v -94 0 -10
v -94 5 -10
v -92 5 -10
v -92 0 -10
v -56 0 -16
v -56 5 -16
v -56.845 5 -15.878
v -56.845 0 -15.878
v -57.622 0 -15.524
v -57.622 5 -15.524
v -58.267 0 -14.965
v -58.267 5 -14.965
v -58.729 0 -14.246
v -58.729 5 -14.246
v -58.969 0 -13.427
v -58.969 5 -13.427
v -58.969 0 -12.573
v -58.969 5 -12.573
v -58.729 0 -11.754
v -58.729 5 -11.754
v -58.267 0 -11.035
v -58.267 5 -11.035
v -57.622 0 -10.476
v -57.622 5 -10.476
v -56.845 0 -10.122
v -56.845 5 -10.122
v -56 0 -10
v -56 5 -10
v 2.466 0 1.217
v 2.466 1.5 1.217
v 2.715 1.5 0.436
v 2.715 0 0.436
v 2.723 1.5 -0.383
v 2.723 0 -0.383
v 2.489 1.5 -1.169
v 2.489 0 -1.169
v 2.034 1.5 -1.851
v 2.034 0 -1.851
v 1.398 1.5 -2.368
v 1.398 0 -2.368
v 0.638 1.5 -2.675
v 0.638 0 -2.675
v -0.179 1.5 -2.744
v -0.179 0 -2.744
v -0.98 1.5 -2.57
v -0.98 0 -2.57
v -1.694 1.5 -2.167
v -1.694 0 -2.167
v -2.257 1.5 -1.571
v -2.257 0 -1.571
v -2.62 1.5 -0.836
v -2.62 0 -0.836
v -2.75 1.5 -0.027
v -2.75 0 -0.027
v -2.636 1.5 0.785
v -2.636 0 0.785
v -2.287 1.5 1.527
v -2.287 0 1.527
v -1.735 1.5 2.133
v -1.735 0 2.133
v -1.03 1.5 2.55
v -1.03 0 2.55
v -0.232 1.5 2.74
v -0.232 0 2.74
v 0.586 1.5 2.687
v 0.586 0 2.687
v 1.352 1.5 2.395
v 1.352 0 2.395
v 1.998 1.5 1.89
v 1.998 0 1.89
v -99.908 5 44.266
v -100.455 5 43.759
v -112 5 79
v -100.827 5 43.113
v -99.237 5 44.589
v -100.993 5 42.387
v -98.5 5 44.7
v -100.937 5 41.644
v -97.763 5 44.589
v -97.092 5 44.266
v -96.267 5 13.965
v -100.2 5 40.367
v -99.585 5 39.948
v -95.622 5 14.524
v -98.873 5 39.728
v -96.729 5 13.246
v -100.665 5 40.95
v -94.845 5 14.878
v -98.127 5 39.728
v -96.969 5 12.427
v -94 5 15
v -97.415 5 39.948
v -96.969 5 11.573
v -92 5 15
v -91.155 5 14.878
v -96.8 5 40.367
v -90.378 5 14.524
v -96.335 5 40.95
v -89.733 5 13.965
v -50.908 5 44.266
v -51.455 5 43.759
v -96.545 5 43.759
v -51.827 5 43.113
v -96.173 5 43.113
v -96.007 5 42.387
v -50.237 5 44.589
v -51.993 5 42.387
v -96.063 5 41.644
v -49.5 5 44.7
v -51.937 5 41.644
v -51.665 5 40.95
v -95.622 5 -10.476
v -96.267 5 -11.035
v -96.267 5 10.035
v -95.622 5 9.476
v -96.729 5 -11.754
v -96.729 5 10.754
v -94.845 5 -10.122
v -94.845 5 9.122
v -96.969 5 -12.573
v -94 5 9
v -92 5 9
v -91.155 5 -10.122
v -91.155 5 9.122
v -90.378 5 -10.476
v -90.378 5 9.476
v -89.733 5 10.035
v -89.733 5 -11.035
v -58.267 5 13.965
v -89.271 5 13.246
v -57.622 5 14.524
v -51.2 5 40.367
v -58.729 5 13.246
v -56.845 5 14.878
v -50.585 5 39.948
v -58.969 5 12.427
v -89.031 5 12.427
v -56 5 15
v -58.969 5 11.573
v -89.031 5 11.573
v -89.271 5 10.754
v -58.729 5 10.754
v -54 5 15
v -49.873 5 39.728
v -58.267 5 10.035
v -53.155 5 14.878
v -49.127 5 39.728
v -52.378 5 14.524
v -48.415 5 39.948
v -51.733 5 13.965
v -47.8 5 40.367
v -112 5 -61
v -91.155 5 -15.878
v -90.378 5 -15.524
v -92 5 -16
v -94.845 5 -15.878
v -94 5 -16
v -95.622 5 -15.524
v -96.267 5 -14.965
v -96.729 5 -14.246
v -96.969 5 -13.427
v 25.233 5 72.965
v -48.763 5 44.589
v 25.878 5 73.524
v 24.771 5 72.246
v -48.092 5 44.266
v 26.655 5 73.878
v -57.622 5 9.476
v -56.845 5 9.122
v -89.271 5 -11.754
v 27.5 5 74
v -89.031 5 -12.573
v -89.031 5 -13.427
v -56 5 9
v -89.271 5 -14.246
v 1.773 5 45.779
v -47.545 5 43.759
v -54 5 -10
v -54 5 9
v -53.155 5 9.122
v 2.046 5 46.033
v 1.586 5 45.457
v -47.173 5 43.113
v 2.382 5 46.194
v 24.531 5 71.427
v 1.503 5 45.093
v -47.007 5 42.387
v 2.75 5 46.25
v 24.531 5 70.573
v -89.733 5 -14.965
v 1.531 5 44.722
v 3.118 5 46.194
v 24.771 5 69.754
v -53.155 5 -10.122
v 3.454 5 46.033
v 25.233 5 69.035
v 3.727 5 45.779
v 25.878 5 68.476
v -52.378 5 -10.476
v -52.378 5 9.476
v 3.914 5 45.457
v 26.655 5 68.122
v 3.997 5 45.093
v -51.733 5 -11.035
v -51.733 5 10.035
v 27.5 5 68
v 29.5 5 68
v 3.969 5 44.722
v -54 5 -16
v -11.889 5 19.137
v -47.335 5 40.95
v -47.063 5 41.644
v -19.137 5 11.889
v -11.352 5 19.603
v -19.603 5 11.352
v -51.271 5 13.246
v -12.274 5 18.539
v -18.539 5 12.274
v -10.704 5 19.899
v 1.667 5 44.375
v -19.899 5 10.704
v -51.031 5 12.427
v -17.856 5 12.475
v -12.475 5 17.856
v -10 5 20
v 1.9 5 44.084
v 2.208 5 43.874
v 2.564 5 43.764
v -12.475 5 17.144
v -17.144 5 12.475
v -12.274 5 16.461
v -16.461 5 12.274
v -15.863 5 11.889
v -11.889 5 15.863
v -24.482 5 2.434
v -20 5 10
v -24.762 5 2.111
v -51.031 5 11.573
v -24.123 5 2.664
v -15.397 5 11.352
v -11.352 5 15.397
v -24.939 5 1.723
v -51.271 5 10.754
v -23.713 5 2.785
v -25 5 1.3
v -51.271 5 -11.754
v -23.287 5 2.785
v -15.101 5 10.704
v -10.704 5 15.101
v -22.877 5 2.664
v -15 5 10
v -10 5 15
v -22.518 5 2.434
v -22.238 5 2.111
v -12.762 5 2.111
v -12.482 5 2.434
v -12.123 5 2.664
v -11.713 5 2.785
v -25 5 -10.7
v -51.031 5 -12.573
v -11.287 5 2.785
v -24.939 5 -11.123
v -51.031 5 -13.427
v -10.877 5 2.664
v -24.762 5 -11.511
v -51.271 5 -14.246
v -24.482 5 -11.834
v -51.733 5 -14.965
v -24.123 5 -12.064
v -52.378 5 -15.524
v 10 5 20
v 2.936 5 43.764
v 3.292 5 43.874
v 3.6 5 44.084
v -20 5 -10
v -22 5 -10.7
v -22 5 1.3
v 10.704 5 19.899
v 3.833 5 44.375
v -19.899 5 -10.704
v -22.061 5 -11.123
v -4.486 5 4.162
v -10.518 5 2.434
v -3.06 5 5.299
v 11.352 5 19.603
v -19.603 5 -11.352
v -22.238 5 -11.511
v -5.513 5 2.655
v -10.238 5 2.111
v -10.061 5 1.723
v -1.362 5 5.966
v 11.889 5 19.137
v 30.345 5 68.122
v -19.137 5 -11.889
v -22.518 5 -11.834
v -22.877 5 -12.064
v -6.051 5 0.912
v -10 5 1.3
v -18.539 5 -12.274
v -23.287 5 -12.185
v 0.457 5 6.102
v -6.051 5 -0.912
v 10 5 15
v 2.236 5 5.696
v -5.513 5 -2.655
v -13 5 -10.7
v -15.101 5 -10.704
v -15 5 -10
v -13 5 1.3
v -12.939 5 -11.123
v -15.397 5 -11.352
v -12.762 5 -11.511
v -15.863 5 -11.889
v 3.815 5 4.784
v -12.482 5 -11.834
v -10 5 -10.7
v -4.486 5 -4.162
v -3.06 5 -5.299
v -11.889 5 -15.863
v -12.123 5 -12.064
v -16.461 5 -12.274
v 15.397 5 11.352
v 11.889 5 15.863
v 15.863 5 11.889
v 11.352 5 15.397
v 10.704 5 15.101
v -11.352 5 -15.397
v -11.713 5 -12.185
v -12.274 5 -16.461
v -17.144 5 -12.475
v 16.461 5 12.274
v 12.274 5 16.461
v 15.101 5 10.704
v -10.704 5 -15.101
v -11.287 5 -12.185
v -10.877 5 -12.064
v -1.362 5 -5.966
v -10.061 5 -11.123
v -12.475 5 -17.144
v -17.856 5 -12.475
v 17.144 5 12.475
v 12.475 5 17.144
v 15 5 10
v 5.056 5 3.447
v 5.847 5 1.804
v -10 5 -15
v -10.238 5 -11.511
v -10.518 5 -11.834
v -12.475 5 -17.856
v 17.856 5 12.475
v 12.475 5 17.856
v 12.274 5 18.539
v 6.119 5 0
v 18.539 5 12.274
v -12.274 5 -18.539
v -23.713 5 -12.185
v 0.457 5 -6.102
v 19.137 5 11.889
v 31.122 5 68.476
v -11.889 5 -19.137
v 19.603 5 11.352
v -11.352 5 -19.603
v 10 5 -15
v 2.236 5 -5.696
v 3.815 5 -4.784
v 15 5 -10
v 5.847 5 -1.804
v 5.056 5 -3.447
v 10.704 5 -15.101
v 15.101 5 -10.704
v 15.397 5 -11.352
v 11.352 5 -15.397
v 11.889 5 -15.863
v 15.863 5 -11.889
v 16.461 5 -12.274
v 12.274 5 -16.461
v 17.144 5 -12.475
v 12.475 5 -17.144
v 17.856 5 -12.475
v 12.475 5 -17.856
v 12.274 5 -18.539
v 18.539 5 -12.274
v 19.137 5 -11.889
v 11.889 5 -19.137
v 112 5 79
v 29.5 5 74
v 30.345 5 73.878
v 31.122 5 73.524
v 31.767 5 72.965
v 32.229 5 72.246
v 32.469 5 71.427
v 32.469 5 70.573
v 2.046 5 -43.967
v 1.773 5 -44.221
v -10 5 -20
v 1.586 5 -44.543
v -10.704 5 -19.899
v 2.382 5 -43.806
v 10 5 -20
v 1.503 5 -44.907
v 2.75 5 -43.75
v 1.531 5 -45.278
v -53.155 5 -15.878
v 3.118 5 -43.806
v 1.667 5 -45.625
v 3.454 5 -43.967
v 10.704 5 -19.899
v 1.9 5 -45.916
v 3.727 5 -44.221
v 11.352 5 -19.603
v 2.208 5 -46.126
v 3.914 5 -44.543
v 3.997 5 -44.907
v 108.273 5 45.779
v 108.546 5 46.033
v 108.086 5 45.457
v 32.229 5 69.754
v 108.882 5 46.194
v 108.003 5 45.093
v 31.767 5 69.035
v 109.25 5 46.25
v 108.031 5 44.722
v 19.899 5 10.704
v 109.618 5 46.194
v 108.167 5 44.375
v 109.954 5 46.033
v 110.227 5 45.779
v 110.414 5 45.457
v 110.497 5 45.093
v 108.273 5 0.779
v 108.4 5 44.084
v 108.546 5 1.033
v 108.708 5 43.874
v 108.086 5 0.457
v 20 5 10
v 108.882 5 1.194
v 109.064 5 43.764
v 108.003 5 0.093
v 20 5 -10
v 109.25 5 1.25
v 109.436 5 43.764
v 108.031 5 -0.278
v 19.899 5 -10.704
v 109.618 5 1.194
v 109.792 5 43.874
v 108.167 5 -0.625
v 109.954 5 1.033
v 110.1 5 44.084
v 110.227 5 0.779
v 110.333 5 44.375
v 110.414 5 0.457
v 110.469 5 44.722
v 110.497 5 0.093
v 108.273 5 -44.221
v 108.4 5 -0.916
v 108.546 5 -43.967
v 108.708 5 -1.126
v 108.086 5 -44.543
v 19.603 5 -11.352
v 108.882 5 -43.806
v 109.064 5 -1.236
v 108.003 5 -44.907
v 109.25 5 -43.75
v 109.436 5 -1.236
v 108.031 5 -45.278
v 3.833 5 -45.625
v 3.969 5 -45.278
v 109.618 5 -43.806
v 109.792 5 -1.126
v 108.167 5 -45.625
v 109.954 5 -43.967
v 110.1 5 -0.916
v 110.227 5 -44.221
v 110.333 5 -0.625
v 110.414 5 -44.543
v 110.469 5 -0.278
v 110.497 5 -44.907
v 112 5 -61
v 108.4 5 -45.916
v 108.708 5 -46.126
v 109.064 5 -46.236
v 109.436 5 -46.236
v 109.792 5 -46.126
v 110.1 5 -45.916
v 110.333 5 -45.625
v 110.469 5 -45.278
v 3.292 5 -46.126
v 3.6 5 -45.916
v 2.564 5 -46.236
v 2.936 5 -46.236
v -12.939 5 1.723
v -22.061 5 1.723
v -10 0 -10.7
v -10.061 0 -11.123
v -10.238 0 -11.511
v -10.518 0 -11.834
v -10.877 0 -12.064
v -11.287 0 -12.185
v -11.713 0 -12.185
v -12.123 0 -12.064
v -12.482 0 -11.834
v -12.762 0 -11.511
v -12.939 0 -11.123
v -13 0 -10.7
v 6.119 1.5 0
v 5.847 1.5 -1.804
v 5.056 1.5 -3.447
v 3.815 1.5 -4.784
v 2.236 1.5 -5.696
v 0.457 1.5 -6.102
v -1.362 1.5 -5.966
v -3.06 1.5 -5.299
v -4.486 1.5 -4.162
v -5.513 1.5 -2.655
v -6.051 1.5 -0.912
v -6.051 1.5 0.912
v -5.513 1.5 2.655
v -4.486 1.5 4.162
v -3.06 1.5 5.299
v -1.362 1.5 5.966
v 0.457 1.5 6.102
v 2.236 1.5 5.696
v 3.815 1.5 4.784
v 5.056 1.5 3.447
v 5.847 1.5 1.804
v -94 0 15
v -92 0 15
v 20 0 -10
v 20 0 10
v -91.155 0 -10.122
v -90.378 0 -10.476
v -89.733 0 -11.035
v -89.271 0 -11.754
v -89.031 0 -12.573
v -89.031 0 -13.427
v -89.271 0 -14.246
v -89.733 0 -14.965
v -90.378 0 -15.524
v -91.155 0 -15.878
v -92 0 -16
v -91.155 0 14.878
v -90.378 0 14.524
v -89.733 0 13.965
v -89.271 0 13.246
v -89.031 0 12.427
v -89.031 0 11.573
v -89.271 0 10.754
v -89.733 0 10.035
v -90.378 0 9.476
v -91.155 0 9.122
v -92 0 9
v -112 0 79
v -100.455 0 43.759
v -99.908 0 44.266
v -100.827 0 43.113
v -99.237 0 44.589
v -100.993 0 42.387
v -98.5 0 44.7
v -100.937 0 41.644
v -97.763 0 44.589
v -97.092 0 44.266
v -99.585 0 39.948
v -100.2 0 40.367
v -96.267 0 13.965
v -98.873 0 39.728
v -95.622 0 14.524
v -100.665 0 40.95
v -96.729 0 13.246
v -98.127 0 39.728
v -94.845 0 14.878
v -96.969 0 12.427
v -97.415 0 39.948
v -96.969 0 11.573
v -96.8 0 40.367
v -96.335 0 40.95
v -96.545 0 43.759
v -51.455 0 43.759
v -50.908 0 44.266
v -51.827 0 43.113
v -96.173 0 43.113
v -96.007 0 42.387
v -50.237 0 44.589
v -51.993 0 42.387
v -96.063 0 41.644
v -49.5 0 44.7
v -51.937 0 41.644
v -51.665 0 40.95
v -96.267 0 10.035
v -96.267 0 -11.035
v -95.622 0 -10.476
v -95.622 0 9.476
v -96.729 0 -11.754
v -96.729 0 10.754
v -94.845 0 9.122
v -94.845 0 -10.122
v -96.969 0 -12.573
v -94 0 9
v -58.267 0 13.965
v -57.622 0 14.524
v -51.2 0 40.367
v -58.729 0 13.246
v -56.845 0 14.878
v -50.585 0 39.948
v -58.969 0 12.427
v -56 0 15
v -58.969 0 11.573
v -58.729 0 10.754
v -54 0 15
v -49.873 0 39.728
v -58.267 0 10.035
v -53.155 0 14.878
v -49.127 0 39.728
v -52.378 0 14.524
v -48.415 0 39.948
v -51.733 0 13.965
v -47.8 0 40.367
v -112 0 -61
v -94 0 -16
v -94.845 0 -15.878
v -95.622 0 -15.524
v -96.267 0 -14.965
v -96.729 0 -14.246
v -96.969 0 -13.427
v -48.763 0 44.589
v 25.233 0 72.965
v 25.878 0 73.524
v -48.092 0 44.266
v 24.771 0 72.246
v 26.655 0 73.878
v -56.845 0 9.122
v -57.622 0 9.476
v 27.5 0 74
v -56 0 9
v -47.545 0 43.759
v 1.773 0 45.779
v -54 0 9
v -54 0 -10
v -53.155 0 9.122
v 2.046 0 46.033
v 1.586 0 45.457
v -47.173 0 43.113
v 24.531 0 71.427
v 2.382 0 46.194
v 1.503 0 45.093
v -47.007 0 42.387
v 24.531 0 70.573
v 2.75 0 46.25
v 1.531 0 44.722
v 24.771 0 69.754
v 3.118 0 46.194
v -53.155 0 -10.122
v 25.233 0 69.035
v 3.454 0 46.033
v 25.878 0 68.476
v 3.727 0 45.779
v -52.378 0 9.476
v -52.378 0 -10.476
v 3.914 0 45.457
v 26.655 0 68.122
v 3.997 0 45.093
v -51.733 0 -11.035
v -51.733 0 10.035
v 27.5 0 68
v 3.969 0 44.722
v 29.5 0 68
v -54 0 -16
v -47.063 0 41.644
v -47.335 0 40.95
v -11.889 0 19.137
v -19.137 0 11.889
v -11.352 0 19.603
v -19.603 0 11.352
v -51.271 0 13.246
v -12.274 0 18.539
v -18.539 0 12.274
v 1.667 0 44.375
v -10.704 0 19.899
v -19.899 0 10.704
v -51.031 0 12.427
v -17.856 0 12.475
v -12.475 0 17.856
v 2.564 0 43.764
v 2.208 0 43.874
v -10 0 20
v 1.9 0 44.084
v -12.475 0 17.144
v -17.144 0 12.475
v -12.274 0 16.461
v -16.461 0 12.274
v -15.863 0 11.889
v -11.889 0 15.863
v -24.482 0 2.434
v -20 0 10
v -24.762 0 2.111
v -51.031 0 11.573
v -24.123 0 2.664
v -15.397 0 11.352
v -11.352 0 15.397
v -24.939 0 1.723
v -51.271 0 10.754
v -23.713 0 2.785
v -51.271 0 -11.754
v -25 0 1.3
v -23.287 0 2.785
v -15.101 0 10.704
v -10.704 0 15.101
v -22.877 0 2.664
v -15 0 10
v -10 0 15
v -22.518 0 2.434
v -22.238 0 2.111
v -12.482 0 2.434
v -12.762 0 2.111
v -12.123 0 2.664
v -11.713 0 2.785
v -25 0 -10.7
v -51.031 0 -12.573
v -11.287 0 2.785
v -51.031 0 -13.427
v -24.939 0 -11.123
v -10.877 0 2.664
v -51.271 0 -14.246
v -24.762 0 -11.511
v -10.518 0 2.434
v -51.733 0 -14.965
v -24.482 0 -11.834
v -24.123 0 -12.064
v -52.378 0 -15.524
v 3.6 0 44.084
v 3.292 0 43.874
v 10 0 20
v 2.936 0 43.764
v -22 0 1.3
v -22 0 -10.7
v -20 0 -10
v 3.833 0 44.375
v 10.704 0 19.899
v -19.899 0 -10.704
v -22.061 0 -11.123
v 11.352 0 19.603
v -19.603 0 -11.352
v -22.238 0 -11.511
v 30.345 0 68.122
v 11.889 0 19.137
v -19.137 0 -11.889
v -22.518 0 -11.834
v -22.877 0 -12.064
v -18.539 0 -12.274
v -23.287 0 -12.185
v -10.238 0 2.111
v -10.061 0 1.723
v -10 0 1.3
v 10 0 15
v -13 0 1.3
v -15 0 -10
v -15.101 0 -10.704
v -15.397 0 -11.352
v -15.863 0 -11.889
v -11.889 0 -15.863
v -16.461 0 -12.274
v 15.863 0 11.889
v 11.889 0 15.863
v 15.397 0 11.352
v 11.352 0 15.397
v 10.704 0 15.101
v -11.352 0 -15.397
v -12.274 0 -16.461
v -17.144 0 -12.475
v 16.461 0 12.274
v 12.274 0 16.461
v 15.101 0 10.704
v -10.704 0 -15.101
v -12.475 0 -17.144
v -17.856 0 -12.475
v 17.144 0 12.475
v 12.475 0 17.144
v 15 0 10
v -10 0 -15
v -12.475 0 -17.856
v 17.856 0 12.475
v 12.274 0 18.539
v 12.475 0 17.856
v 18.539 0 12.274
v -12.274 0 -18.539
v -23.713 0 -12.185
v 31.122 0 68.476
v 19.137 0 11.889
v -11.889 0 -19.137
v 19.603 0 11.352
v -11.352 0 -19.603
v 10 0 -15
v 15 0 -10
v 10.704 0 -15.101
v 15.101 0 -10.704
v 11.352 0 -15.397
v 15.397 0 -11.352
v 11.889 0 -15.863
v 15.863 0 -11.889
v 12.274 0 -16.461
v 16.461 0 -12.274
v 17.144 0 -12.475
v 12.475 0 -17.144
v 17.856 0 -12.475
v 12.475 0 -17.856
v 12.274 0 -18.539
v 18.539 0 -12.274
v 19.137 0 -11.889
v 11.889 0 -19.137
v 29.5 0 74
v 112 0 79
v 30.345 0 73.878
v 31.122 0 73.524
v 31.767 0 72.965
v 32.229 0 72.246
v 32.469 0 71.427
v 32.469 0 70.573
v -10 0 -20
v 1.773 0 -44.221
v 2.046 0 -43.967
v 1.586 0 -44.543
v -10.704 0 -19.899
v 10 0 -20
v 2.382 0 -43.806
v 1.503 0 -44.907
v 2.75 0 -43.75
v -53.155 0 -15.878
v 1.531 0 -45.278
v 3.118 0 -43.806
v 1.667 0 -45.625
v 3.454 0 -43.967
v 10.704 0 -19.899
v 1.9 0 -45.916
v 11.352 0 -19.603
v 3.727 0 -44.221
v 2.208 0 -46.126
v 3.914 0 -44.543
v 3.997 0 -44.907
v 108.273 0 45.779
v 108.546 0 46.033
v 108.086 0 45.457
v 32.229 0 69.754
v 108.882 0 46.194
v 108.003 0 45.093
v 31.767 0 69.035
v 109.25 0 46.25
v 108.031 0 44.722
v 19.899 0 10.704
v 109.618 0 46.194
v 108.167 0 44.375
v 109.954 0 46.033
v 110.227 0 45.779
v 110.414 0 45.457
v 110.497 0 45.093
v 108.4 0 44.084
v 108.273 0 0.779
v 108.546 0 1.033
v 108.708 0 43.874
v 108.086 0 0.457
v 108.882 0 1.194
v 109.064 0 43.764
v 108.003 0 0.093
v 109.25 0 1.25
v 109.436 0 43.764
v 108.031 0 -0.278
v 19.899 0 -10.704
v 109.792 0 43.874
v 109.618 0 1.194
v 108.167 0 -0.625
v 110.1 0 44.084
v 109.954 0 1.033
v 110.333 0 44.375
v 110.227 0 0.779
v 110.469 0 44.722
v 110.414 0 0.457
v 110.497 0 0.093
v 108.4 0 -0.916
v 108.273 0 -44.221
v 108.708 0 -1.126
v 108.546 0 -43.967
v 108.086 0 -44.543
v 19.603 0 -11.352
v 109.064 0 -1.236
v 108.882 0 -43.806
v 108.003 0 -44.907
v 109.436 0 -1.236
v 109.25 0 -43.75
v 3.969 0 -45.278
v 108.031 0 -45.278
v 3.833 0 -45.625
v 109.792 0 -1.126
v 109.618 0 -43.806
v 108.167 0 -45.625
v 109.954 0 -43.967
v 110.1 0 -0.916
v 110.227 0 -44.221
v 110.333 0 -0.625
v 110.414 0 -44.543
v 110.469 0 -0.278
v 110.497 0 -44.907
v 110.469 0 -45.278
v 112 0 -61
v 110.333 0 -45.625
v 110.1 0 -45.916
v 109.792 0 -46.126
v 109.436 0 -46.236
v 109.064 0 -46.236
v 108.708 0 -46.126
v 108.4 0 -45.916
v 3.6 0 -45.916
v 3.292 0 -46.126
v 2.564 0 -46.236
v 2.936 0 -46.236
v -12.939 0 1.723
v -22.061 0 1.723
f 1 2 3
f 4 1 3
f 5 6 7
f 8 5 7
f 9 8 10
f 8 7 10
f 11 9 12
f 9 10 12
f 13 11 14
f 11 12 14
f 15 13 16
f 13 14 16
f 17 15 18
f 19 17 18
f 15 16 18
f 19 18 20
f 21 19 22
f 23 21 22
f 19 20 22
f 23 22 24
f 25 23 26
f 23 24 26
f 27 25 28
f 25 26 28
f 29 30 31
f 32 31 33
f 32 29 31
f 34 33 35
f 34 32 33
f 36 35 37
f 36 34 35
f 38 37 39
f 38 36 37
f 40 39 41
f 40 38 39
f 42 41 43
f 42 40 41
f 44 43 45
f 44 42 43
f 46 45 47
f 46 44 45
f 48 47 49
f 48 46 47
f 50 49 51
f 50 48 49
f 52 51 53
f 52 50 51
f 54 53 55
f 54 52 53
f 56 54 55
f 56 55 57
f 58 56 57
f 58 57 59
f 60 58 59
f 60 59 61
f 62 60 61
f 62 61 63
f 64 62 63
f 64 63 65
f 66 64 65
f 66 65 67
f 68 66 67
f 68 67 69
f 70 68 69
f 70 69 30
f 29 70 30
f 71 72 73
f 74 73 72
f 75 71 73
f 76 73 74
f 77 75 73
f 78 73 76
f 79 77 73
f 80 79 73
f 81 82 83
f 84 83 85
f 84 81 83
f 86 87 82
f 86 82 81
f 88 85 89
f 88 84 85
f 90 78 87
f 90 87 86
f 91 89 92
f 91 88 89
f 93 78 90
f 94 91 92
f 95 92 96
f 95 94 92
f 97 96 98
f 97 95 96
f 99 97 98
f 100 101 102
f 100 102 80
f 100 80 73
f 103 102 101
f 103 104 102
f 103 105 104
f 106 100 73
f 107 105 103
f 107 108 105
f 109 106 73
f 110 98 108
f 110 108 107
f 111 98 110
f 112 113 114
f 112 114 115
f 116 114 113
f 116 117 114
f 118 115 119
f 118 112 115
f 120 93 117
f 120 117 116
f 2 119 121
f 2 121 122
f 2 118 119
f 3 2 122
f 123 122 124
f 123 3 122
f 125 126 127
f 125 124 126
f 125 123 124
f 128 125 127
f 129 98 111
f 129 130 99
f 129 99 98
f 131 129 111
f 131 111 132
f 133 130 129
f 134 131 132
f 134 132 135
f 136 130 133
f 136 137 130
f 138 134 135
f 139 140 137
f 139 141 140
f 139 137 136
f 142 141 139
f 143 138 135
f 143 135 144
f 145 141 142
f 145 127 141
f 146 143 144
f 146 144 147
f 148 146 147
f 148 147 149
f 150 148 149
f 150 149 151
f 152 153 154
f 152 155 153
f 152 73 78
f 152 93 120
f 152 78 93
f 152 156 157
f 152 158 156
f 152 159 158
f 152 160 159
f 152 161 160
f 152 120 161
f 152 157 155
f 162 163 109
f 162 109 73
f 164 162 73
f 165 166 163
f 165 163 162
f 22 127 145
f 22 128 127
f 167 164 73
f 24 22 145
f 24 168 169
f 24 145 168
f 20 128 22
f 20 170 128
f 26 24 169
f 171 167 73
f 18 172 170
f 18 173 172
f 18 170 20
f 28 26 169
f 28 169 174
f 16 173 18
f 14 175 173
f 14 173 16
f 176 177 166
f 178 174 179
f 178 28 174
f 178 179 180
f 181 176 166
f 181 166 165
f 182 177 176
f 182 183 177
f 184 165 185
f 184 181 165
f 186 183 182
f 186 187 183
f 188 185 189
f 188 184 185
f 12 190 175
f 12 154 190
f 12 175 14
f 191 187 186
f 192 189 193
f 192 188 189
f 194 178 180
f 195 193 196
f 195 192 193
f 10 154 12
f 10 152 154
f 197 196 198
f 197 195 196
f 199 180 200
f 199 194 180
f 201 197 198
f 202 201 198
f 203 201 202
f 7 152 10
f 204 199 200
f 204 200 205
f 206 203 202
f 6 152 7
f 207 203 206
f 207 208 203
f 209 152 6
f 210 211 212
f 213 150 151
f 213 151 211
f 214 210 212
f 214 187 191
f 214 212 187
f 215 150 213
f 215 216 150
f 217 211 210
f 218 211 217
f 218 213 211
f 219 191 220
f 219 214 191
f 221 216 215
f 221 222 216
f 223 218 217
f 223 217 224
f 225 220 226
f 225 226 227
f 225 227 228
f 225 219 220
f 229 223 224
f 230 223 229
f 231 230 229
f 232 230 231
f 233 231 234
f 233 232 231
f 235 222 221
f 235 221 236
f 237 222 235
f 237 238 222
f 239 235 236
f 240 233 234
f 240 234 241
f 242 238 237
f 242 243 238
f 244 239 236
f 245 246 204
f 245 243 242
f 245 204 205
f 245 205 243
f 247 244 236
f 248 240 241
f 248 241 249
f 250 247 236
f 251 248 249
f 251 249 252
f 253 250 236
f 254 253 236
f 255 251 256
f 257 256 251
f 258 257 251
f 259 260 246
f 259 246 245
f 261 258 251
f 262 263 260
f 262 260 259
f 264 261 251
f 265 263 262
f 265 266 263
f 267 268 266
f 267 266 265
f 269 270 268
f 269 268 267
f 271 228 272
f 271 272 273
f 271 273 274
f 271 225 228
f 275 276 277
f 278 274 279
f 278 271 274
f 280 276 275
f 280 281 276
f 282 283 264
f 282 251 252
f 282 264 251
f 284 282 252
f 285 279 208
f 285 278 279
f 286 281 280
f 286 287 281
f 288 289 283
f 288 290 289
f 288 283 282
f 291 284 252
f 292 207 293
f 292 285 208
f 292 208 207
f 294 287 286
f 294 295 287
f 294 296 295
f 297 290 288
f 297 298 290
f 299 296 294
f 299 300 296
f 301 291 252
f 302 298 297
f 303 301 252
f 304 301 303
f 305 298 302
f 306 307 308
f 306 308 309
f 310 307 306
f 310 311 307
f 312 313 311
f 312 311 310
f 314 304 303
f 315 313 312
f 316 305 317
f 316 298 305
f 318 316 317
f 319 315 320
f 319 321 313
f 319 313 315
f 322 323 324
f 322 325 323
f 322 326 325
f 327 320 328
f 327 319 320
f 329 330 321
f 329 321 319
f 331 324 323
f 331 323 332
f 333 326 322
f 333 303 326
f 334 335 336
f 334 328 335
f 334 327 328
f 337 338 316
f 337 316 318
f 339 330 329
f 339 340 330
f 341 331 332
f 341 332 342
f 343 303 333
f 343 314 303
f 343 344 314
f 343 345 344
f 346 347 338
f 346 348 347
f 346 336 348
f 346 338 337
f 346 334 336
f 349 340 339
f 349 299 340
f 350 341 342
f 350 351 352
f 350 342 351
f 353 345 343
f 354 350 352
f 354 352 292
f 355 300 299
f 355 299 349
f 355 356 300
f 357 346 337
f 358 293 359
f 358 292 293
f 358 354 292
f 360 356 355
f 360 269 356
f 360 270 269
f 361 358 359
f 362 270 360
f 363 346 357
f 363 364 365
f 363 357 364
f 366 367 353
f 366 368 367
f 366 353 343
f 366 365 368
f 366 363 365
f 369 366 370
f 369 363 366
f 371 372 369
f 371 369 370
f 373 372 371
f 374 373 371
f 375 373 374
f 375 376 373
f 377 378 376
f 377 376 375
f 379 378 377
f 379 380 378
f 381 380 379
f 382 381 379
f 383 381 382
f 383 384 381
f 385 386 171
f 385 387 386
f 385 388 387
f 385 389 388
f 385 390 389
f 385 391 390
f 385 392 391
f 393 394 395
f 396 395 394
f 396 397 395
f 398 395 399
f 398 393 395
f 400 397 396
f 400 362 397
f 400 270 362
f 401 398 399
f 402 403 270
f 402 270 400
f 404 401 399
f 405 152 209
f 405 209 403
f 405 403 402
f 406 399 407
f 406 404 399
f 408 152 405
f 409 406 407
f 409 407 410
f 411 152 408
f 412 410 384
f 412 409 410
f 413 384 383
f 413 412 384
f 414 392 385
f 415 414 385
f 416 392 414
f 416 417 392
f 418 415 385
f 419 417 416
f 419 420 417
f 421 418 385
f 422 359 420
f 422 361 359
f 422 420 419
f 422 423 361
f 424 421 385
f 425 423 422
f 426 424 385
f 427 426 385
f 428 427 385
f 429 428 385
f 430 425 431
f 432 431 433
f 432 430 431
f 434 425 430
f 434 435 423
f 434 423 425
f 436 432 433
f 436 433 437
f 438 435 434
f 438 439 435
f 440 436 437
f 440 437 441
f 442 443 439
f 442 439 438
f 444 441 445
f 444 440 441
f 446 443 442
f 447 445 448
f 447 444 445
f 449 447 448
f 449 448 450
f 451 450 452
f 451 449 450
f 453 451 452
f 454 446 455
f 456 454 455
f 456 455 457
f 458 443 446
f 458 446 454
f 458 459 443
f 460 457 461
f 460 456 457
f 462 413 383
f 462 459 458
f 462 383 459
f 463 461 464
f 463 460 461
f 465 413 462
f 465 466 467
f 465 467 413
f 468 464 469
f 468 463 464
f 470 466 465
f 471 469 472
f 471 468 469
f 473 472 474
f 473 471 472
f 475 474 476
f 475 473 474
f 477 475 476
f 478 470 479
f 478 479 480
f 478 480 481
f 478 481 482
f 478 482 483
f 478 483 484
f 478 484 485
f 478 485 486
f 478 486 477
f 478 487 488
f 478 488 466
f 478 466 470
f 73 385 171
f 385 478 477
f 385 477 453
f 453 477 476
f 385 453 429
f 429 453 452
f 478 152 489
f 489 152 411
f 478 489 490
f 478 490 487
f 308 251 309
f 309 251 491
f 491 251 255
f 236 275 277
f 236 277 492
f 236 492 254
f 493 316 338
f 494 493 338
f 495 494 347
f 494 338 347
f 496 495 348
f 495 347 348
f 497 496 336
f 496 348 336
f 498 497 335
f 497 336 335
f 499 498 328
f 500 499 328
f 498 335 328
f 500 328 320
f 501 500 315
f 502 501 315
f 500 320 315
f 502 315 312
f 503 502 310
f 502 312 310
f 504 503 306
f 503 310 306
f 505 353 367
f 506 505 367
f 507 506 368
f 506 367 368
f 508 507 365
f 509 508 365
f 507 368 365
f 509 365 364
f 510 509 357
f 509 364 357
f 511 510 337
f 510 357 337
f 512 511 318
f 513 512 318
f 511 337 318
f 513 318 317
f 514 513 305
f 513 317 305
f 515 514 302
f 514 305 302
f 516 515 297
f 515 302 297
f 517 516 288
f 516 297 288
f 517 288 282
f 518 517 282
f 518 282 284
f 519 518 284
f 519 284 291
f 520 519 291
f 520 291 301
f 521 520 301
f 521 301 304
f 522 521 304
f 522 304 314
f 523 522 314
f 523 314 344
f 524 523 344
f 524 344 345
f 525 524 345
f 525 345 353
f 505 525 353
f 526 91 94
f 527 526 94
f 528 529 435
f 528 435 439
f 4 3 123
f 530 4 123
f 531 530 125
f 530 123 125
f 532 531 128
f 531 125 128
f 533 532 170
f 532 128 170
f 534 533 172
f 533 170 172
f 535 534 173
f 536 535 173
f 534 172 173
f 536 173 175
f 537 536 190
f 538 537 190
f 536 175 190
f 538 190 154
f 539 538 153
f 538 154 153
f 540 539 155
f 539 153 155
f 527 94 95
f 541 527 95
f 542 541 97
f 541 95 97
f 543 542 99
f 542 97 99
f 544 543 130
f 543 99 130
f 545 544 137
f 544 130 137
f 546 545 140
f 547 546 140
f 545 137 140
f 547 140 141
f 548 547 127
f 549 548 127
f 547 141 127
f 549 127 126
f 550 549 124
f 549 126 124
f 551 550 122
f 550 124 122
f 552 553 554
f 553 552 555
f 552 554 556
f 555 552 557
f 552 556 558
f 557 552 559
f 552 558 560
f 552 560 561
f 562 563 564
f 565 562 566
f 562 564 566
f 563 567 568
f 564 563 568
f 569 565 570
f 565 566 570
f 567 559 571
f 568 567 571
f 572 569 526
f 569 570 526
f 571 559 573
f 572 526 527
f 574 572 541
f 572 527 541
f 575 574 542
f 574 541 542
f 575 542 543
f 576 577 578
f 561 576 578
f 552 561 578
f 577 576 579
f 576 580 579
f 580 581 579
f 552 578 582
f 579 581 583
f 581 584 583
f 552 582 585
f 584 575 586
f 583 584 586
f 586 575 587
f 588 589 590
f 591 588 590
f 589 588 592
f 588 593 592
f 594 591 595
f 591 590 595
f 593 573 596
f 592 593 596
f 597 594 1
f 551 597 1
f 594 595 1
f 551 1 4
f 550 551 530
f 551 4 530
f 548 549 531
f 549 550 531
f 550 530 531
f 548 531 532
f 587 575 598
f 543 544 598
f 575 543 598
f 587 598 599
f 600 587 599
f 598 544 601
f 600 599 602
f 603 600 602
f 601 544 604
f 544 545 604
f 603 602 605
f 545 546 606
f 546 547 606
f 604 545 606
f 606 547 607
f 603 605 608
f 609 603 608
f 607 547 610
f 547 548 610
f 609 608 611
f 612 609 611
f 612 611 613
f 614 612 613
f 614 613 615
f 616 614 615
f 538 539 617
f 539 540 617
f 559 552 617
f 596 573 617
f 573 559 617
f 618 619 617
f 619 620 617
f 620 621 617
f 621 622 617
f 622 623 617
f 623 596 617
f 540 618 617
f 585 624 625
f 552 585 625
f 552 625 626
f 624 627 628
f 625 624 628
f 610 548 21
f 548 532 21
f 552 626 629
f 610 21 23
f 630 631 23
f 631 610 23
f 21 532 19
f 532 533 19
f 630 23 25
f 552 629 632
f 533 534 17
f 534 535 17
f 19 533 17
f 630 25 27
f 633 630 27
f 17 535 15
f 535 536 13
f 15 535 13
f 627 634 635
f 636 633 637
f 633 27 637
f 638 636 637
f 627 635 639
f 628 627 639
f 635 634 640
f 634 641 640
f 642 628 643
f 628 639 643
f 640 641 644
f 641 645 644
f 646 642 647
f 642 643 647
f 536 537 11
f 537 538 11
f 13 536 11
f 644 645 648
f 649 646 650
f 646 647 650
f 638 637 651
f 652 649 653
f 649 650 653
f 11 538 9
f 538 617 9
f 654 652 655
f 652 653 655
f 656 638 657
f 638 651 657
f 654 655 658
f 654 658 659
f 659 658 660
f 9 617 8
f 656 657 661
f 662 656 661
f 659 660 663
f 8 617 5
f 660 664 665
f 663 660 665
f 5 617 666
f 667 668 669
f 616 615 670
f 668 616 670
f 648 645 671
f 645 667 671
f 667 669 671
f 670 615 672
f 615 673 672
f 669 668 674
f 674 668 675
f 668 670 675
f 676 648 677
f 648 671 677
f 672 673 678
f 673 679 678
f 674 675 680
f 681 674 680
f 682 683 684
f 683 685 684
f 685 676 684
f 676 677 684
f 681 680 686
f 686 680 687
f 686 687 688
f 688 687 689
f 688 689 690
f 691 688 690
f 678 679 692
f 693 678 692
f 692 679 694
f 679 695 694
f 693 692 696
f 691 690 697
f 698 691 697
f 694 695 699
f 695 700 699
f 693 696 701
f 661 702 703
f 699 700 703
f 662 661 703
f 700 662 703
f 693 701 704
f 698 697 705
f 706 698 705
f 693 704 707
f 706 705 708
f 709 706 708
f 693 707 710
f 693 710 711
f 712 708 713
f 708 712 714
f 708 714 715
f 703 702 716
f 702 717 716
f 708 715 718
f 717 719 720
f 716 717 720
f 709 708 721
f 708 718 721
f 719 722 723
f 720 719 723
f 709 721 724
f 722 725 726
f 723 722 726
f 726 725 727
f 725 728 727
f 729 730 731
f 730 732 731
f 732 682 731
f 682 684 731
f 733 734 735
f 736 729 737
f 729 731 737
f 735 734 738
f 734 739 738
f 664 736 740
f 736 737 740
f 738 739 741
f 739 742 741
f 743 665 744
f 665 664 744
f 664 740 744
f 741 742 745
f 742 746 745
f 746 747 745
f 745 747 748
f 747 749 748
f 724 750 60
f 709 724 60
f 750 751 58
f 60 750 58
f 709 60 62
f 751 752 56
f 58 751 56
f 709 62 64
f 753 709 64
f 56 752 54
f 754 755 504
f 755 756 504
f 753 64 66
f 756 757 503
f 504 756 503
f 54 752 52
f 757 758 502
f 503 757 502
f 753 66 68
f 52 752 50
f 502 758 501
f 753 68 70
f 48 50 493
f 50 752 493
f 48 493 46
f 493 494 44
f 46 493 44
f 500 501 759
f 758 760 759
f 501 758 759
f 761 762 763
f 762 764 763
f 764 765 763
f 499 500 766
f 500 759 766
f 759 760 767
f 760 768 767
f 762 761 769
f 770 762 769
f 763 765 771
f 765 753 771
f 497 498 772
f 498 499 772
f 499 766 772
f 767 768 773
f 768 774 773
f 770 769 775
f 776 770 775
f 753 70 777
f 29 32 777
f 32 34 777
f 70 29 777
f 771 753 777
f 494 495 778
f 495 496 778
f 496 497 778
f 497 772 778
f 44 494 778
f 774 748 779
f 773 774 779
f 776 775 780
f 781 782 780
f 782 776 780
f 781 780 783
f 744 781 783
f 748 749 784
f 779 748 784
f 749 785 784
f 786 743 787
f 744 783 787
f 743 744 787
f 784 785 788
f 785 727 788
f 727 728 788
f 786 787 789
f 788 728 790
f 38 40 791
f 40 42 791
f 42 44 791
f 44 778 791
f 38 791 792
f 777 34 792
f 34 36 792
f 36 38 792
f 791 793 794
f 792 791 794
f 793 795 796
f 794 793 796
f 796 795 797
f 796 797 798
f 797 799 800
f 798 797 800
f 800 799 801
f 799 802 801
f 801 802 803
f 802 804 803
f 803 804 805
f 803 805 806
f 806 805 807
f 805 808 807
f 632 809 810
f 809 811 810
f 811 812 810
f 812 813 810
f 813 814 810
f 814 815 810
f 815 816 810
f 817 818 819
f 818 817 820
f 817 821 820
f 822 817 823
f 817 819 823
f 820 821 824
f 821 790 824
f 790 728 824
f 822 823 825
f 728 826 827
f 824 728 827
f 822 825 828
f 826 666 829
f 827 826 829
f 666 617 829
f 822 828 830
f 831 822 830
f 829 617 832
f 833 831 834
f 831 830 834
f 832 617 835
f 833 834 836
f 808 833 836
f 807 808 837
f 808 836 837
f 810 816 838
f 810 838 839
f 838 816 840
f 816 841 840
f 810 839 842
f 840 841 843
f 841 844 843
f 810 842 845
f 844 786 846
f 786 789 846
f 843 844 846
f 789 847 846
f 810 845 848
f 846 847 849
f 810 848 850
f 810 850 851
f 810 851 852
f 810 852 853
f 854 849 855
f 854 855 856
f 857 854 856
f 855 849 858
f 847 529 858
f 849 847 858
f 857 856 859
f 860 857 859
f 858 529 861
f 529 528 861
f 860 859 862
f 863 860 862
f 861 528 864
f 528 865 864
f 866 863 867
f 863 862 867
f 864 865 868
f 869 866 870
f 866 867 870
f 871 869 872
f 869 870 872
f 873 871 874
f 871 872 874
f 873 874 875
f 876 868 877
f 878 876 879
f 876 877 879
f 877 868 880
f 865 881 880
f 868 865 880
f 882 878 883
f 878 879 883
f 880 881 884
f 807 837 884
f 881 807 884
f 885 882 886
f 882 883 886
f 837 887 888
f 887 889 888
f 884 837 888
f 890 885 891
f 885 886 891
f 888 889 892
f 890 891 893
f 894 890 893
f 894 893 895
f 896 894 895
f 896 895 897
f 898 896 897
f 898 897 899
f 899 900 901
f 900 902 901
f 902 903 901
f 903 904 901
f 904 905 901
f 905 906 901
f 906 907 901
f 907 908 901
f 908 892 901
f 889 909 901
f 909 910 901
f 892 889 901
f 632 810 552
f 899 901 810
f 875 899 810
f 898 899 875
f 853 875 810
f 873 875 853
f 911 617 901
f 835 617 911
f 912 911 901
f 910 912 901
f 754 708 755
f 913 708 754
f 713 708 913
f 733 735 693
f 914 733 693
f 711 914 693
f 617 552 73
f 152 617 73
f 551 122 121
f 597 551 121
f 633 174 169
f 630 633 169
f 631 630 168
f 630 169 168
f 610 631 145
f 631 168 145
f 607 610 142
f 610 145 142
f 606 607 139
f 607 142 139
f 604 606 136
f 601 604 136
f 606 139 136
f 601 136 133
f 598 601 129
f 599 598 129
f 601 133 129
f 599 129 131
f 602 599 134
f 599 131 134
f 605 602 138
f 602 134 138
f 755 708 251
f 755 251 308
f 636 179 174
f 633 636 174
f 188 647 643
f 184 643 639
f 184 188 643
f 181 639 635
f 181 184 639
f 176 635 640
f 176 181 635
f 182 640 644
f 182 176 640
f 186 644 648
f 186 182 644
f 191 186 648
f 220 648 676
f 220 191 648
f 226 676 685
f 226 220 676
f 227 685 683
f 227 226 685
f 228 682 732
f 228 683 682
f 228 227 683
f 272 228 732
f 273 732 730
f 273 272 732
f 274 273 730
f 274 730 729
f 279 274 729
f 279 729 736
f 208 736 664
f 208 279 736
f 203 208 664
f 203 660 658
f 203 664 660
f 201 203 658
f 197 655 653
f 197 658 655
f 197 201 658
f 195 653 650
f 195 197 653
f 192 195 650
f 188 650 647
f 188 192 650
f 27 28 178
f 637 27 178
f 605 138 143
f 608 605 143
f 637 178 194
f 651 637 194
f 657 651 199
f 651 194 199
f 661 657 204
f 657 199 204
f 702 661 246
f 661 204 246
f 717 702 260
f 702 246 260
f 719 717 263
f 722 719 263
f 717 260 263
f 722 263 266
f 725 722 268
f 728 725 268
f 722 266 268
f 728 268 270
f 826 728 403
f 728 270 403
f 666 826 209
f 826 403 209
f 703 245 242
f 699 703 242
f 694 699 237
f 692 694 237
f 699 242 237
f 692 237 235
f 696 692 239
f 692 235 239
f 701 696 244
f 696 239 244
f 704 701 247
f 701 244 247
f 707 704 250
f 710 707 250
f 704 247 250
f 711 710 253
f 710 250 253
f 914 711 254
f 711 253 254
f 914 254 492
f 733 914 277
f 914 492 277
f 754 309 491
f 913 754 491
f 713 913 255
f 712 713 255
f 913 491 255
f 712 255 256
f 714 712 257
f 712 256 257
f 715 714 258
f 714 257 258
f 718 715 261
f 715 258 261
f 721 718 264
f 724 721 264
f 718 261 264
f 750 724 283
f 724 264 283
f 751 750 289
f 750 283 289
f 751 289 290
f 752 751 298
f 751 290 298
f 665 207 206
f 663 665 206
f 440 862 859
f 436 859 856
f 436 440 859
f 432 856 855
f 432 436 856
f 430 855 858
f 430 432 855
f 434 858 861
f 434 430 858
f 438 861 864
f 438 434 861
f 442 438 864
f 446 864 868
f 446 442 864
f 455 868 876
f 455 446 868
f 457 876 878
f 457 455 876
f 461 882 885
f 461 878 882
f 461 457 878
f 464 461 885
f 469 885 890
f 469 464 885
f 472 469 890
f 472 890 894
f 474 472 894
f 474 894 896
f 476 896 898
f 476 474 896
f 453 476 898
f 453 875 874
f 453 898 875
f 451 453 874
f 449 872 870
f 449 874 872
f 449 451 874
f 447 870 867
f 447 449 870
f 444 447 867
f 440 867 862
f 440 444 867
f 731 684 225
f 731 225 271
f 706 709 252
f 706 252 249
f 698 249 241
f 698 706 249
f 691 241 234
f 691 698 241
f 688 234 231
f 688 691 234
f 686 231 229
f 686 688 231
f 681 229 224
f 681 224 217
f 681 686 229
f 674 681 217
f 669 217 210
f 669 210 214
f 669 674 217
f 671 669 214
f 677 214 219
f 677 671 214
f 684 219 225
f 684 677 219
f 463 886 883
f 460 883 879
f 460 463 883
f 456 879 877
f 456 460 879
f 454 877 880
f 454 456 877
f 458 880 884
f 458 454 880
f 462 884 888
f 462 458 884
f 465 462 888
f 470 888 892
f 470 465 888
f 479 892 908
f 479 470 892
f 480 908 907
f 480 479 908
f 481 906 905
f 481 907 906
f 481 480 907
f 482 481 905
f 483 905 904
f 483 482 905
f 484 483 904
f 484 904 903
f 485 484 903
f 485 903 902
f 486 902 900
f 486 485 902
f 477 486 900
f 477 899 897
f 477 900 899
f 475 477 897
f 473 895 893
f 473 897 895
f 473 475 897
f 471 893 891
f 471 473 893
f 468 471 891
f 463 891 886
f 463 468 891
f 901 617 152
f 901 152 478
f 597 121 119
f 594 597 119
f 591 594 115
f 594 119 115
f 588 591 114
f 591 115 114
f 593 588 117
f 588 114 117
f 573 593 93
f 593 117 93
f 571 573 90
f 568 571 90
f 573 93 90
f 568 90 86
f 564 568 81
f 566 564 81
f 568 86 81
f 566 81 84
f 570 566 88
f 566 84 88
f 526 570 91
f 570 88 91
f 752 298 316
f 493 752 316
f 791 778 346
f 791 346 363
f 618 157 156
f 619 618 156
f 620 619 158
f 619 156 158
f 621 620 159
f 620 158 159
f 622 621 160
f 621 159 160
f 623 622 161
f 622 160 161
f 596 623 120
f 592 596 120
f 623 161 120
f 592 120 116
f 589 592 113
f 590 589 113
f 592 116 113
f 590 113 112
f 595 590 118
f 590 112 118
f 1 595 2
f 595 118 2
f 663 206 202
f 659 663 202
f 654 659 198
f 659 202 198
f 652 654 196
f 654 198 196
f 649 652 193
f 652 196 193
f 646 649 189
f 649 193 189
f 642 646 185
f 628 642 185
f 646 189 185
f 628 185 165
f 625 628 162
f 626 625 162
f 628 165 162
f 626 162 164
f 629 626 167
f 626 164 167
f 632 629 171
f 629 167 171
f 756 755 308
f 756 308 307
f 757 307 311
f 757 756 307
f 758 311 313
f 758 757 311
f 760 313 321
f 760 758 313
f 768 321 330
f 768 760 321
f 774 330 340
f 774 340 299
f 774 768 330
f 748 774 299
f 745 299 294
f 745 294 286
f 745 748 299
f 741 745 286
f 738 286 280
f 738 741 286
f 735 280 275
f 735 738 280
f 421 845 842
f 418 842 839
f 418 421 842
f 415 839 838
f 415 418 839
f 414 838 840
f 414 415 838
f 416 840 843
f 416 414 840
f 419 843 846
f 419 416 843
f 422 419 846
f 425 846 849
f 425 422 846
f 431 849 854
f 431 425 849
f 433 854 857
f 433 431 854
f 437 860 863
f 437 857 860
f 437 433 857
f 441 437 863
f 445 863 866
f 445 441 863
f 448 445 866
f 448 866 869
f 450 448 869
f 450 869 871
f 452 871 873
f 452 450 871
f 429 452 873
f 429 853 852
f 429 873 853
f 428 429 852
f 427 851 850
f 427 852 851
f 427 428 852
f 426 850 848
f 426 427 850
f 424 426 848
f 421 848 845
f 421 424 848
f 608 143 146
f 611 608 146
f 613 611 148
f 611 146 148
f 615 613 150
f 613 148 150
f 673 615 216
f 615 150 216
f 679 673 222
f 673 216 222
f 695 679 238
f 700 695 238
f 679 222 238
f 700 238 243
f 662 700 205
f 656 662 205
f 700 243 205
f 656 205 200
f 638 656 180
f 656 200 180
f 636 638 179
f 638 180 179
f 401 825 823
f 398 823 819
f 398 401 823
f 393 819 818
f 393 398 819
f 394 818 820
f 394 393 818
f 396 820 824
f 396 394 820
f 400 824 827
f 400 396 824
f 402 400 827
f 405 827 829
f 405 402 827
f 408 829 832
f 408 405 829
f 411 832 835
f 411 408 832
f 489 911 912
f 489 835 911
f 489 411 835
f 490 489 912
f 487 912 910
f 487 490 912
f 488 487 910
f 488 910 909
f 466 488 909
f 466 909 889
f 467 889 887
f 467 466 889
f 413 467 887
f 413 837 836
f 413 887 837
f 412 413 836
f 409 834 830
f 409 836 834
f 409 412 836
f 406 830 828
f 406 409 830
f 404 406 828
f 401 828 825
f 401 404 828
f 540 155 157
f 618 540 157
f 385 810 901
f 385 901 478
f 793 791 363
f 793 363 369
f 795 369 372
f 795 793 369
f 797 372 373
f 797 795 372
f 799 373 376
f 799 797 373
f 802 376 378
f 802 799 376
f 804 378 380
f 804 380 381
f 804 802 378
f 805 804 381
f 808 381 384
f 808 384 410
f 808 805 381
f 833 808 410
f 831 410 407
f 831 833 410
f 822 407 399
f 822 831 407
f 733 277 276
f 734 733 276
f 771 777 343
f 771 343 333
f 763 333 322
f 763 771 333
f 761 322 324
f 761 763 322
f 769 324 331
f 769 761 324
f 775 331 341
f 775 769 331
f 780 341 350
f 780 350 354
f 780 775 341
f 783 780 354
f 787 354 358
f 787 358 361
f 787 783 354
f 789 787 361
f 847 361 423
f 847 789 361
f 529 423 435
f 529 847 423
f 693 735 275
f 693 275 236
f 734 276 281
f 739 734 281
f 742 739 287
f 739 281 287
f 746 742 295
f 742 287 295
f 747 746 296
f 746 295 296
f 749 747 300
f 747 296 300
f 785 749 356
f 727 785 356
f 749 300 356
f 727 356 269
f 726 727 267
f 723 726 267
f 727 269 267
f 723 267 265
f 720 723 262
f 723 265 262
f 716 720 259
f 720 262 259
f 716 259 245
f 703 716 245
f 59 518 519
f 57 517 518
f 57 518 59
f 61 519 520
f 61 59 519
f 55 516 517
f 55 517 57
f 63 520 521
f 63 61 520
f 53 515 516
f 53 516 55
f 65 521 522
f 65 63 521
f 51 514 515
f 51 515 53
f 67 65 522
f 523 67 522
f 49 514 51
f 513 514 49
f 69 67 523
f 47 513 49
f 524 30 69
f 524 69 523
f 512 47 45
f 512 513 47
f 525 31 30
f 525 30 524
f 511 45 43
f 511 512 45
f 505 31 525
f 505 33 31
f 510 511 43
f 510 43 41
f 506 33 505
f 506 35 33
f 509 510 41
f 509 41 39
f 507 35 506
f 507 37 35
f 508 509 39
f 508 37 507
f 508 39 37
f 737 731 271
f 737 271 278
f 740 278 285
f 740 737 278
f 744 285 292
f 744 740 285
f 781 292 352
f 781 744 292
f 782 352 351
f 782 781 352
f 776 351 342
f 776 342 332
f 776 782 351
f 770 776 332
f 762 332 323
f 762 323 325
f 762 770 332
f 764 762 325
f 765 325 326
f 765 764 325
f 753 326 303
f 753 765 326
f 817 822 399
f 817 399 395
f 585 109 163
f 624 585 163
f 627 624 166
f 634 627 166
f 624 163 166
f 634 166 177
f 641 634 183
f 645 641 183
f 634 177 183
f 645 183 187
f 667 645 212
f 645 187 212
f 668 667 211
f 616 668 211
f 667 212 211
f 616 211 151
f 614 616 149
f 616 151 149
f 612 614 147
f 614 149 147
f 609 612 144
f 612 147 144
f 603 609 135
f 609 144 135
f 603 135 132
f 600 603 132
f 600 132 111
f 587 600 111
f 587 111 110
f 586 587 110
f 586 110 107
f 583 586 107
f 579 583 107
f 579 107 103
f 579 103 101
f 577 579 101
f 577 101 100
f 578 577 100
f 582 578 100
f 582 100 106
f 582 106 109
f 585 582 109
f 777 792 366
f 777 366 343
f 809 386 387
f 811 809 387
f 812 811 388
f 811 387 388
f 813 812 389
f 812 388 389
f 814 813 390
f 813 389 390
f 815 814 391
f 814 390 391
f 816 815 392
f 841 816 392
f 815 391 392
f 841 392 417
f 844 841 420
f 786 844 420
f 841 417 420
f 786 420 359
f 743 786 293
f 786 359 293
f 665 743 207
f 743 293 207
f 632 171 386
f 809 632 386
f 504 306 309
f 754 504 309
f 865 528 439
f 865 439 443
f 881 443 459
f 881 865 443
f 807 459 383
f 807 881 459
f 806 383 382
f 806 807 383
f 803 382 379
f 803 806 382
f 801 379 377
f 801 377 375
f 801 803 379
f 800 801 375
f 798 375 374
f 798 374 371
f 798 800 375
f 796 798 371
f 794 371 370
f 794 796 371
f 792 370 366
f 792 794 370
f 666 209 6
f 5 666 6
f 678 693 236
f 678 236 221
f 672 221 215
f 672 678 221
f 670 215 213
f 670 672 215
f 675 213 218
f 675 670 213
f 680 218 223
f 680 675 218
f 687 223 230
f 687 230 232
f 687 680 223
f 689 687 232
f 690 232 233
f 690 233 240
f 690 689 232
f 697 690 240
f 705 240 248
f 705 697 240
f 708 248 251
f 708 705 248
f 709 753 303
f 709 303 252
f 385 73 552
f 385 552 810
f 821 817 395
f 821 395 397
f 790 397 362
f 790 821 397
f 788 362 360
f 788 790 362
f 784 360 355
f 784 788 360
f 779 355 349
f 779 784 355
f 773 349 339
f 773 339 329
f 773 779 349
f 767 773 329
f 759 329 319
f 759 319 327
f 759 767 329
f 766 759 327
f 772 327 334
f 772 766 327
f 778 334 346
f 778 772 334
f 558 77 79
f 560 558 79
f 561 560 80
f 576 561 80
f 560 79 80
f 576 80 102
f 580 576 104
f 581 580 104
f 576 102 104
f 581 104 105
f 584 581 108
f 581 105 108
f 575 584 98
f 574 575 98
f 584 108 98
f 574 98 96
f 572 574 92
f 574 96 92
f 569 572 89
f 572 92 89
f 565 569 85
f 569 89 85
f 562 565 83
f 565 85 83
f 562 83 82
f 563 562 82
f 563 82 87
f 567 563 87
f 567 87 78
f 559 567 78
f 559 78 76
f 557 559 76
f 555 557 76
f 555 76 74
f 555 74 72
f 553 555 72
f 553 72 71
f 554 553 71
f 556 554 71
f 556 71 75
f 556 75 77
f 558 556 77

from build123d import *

# Parameters (mm, degrees)
SKETCH1_W                               = 224
SKETCH1_H                               = 122
BOSS_EXTRUDE1_DEPTH                     = 5
CUT_EXTRUDE1_DEPTH                      = 5
CIRPATTERN1_COUNT                       = 4
SKETCH3_R                               = 2.75
CUT_EXTRUDE5_DEPTH                      = 5
CBORE_FOR_M5_HEX_HEAD_BOLT1_D           = 5.5
CBORE_FOR_M5_HEX_HEAD_BOLT1_DEPTH       = 12.4
CBORE_FOR_M5_HEX_HEAD_BOLT1_CBORE_D     = 12.238
CBORE_FOR_M5_HEX_HEAD_BOLT1_CBORE_DEPTH = 3.5
CBORE_FOR_M5_HEX_HEAD_BOLT1_TIP         = 1.652366702
F_2_5MM_DOWEL_HOLE1_AT_2_COUNT          = 2
F_2_5MM_DOWEL_HOLE1_AT_2_PITCH          = 45
F_2_5MM_DOWEL_HOLE1_AT_3_COUNT          = 2
F_2_5MM_DOWEL_HOLE1_AT_3_PITCH          = 90
LPATTERN1_COUNT                         = 2
LPATTERN1_PITCH                         = 106.5
BOSS_EXTRUDE3_START                     = -1.5
SKETCH11_R                              = 4
SKETCH11_R_2                            = 2.75
BOSS_EXTRUDE3_DEPTH                     = 1.5
CUT_EXTRUDE6_DEPTH                      = 10
LPATTERN2_COUNT                         = 2
LPATTERN2_PITCH                         = 25
SKETCH13_R                              = 2.5
CUT_EXTRUDE7_DEPTH                      = 10
SKETCH15_W                              = 224
SKETCH15_H                              = 5
BOSS_EXTRUDE4_DEPTH                     = 18
CUT_EXTRUDE8_DEPTH                      = 5
CUT_EXTRUDE9_DEPTH                      = 10


with BuildPart() as part:
    # Sketch1 → Boss-Extrude1 (new body)
    with BuildSketch(Plane(origin=(0, 0, 0), x_dir=(1, 0, 0), z_dir=(0, 1, 0))):
        Rectangle(SKETCH1_W, SKETCH1_H)
    extrude(amount=BOSS_EXTRUDE1_DEPTH)

    # Sketch2 → Cut-Extrude1 (cut)
    with BuildSketch(Plane.XZ):
        with BuildLine():
            Line((-15, 10), (-15, -10))
            ThreePointArc((-15, -10), (-17.5, -12.5), (-20, -10))
            Line((-20, -10), (-20, 10))
            ThreePointArc((-20, 10), (-17.5, 12.5), (-15, 10))
        make_face()
    cut_extrude1 = extrude(amount=-CUT_EXTRUDE1_DEPTH, mode=Mode.SUBTRACT)

    # CirPattern1: Cut-Extrude1 ×4 about axis
    cirpattern1_axis = Axis((0, 0, 0), (0, 1, 0))
    for i in range(1, CIRPATTERN1_COUNT):
        add(cut_extrude1.rotate(cirpattern1_axis, i * 360 / CIRPATTERN1_COUNT), mode=Mode.SUBTRACT)

    # Sketch3 → Cut-Extrude5 (cut)
    with BuildSketch(Plane(origin=(0, 0, 0), x_dir=(1, 0, 0), z_dir=(0, 1, 0))):
        with Locations(Location((0, 0, 0), (0, 0, 270))):
            Circle(SKETCH3_R)
    extrude(amount=CUT_EXTRUDE5_DEPTH, mode=Mode.SUBTRACT)

    # CBORE for M5 Hex Head Bolt1
    with Locations(Plane(origin=(0, 5, 0), x_dir=(1, 0, 0), z_dir=(0, 1, 0))):
        with Locations((0, 0)):
            CounterBoreHole(CBORE_FOR_M5_HEX_HEAD_BOLT1_D / 2, CBORE_FOR_M5_HEX_HEAD_BOLT1_CBORE_D / 2, CBORE_FOR_M5_HEX_HEAD_BOLT1_CBORE_DEPTH, depth=CBORE_FOR_M5_HEX_HEAD_BOLT1_DEPTH)
            with Locations((0, 0, -(CBORE_FOR_M5_HEX_HEAD_BOLT1_DEPTH + CBORE_FOR_M5_HEX_HEAD_BOLT1_TIP / 2))):  # 118° drill point
                Cone(0, CBORE_FOR_M5_HEX_HEAD_BOLT1_D / 2, CBORE_FOR_M5_HEX_HEAD_BOLT1_TIP, mode=Mode.SUBTRACT)

    # Sketch10 → Ø2.5mm Dowel Hole1 (revolve, cut)
    with BuildSketch(Plane(origin=(109.25, 5, 45), x_dir=(0, 0, 1), z_dir=(1, 0, 0))):
        Polygon((0, 0), (0, 13.151075774), (1.25, 12.4), (1.25, 0), align=None)
    f_2_5mm_dowel_hole1 = revolve(axis=Axis((109.25, 11.35, 45), (0, -1, 0)), mode=Mode.SUBTRACT)

    # Ø2.5mm Dowel Hole1 at 2: Ø2.5mm Dowel Hole1 ×2
    with Locations(*[(0, 0, -i * F_2_5MM_DOWEL_HOLE1_AT_2_PITCH) for i in range(1, F_2_5MM_DOWEL_HOLE1_AT_2_COUNT)]):
        add(f_2_5mm_dowel_hole1, mode=Mode.SUBTRACT)

    # Ø2.5mm Dowel Hole1 at 3: Ø2.5mm Dowel Hole1 ×2
    with Locations(*[(0, 0, -i * F_2_5MM_DOWEL_HOLE1_AT_3_PITCH) for i in range(1, F_2_5MM_DOWEL_HOLE1_AT_3_COUNT)]):
        add(f_2_5mm_dowel_hole1, mode=Mode.SUBTRACT)

    # LPattern1: Ø2.5mm Dowel Hole1 ×2
    with Locations(*[(-i * LPATTERN1_PITCH, 0, 0) for i in range(1, LPATTERN1_COUNT)]):
        add(f_2_5mm_dowel_hole1, mode=Mode.SUBTRACT)

    # LPattern1 copy 1 sketch → LPattern1 copy 1 (revolve, cut)
    with BuildSketch(Plane(origin=(2.75, 5, 0), x_dir=(0, 0, 1), z_dir=(1, 0, 0))):
        Polygon((0, 0), (0, 13.151075774), (1.25, 12.4), (1.25, 0), align=None)
    revolve(axis=Axis((2.75, 11.35, 0), (0, -1, 0)), mode=Mode.SUBTRACT)

    # LPattern1 copy 2 sketch → LPattern1 copy 2 (revolve, cut)
    with BuildSketch(Plane(origin=(2.75, 5, -45), x_dir=(0, 0, 1), z_dir=(1, 0, 0))):
        Polygon((0, 0), (0, 13.151075774), (1.25, 12.4), (1.25, 0), align=None)
    revolve(axis=Axis((2.75, 11.35, -45), (0, -1, 0)), mode=Mode.SUBTRACT)

    # Sketch11 → Boss-Extrude3 (add)
    with BuildSketch(Plane(origin=(0, 1.5, 0), x_dir=(1, 0, 0), z_dir=(0, 1, 0)).offset(BOSS_EXTRUDE3_START)):
        Circle(SKETCH11_R)
        with Locations(Location((0, 0, 0), (0, 0, 270))):
            Circle(SKETCH11_R_2, mode=Mode.SUBTRACT)
    extrude(amount=BOSS_EXTRUDE3_DEPTH)

    # Sketch12 → Cut-Extrude6 (cut)
    with BuildSketch(Plane(origin=(0, 5, 0), x_dir=(1, 0, 0), z_dir=(0, 1, 0))):
        with BuildLine():
            Line((-94, -15), (-92, -15))
            ThreePointArc((-92, -15), (-89, -12), (-92, -9))
            Line((-92, -9), (-94, -9))
            ThreePointArc((-94, -9), (-97, -12), (-94, -15))
        make_face()
        with BuildLine():
            Line((-56, -15), (-54, -15))
            ThreePointArc((-54, -15), (-51, -12), (-54, -9))
            Line((-54, -9), (-56, -9))
            ThreePointArc((-56, -9), (-59, -12), (-56, -15))
        make_face()
    cut_extrude6 = extrude(amount=-CUT_EXTRUDE6_DEPTH, mode=Mode.SUBTRACT)

    # LPattern2: Cut-Extrude6 ×2
    with Locations(*[(0, 0, -i * LPATTERN2_PITCH) for i in range(1, LPATTERN2_COUNT)]):
        add(cut_extrude6, mode=Mode.SUBTRACT)

    # Sketch13 → Cut-Extrude7 (cut)
    with BuildSketch(Plane(origin=(0, 5, 0), x_dir=(1, 0, 0), z_dir=(0, 1, 0))):
        with Locations(Location((-98.5, -42.2, 0), (0, 0, 270))):
            Circle(SKETCH13_R)
        with Locations(Location((-49.5, -42.2, 0), (0, 0, 270))):
            Circle(SKETCH13_R)
    extrude(amount=-CUT_EXTRUDE7_DEPTH, mode=Mode.SUBTRACT)

    # Sketch15 → Boss-Extrude4 (add)
    with BuildSketch(Plane.XY.offset(61)):
        with Locations((0, 2.5)):
            Rectangle(SKETCH15_W, SKETCH15_H)
    extrude(amount=BOSS_EXTRUDE4_DEPTH)

    # Sketch14 → Cut-Extrude8 (cut)
    with BuildSketch(Plane(origin=(0, 5, 0), x_dir=(1, 0, 0), z_dir=(0, 1, 0))):
        with BuildLine():
            Line((29.5, -68), (27.5, -68))
            ThreePointArc((27.5, -68), (24.5, -71), (27.5, -74))
            Line((27.5, -74), (29.5, -74))
            ThreePointArc((29.5, -74), (32.5, -71), (29.5, -68))
        make_face()
    extrude(amount=-CUT_EXTRUDE8_DEPTH, mode=Mode.SUBTRACT)

    # Sketch16 → Cut-Extrude9 (cut)
    with BuildSketch(Plane(origin=(0, 5, 0), x_dir=(1, 0, 0), z_dir=(0, 1, 0))):
        with BuildLine():
            Line((-13, 10.7), (-13, -1.3))
            ThreePointArc((-13, -1.3), (-11.5, -2.8), (-10, -1.3))
            Line((-10, -1.3), (-10, 10.7))
            ThreePointArc((-10, 10.7), (-11.5, 12.2), (-13, 10.7))
        make_face()
        with BuildLine():
            Line((-25, 10.7), (-25, -1.3))
            ThreePointArc((-25, -1.3), (-23.5, -2.8), (-22, -1.3))
            Line((-22, -1.3), (-22, 10.7))
            ThreePointArc((-22, 10.7), (-23.5, 12.2), (-25, 10.7))
        make_face()
    extrude(amount=-CUT_EXTRUDE9_DEPTH, mode=Mode.SUBTRACT)


solid = part.part
